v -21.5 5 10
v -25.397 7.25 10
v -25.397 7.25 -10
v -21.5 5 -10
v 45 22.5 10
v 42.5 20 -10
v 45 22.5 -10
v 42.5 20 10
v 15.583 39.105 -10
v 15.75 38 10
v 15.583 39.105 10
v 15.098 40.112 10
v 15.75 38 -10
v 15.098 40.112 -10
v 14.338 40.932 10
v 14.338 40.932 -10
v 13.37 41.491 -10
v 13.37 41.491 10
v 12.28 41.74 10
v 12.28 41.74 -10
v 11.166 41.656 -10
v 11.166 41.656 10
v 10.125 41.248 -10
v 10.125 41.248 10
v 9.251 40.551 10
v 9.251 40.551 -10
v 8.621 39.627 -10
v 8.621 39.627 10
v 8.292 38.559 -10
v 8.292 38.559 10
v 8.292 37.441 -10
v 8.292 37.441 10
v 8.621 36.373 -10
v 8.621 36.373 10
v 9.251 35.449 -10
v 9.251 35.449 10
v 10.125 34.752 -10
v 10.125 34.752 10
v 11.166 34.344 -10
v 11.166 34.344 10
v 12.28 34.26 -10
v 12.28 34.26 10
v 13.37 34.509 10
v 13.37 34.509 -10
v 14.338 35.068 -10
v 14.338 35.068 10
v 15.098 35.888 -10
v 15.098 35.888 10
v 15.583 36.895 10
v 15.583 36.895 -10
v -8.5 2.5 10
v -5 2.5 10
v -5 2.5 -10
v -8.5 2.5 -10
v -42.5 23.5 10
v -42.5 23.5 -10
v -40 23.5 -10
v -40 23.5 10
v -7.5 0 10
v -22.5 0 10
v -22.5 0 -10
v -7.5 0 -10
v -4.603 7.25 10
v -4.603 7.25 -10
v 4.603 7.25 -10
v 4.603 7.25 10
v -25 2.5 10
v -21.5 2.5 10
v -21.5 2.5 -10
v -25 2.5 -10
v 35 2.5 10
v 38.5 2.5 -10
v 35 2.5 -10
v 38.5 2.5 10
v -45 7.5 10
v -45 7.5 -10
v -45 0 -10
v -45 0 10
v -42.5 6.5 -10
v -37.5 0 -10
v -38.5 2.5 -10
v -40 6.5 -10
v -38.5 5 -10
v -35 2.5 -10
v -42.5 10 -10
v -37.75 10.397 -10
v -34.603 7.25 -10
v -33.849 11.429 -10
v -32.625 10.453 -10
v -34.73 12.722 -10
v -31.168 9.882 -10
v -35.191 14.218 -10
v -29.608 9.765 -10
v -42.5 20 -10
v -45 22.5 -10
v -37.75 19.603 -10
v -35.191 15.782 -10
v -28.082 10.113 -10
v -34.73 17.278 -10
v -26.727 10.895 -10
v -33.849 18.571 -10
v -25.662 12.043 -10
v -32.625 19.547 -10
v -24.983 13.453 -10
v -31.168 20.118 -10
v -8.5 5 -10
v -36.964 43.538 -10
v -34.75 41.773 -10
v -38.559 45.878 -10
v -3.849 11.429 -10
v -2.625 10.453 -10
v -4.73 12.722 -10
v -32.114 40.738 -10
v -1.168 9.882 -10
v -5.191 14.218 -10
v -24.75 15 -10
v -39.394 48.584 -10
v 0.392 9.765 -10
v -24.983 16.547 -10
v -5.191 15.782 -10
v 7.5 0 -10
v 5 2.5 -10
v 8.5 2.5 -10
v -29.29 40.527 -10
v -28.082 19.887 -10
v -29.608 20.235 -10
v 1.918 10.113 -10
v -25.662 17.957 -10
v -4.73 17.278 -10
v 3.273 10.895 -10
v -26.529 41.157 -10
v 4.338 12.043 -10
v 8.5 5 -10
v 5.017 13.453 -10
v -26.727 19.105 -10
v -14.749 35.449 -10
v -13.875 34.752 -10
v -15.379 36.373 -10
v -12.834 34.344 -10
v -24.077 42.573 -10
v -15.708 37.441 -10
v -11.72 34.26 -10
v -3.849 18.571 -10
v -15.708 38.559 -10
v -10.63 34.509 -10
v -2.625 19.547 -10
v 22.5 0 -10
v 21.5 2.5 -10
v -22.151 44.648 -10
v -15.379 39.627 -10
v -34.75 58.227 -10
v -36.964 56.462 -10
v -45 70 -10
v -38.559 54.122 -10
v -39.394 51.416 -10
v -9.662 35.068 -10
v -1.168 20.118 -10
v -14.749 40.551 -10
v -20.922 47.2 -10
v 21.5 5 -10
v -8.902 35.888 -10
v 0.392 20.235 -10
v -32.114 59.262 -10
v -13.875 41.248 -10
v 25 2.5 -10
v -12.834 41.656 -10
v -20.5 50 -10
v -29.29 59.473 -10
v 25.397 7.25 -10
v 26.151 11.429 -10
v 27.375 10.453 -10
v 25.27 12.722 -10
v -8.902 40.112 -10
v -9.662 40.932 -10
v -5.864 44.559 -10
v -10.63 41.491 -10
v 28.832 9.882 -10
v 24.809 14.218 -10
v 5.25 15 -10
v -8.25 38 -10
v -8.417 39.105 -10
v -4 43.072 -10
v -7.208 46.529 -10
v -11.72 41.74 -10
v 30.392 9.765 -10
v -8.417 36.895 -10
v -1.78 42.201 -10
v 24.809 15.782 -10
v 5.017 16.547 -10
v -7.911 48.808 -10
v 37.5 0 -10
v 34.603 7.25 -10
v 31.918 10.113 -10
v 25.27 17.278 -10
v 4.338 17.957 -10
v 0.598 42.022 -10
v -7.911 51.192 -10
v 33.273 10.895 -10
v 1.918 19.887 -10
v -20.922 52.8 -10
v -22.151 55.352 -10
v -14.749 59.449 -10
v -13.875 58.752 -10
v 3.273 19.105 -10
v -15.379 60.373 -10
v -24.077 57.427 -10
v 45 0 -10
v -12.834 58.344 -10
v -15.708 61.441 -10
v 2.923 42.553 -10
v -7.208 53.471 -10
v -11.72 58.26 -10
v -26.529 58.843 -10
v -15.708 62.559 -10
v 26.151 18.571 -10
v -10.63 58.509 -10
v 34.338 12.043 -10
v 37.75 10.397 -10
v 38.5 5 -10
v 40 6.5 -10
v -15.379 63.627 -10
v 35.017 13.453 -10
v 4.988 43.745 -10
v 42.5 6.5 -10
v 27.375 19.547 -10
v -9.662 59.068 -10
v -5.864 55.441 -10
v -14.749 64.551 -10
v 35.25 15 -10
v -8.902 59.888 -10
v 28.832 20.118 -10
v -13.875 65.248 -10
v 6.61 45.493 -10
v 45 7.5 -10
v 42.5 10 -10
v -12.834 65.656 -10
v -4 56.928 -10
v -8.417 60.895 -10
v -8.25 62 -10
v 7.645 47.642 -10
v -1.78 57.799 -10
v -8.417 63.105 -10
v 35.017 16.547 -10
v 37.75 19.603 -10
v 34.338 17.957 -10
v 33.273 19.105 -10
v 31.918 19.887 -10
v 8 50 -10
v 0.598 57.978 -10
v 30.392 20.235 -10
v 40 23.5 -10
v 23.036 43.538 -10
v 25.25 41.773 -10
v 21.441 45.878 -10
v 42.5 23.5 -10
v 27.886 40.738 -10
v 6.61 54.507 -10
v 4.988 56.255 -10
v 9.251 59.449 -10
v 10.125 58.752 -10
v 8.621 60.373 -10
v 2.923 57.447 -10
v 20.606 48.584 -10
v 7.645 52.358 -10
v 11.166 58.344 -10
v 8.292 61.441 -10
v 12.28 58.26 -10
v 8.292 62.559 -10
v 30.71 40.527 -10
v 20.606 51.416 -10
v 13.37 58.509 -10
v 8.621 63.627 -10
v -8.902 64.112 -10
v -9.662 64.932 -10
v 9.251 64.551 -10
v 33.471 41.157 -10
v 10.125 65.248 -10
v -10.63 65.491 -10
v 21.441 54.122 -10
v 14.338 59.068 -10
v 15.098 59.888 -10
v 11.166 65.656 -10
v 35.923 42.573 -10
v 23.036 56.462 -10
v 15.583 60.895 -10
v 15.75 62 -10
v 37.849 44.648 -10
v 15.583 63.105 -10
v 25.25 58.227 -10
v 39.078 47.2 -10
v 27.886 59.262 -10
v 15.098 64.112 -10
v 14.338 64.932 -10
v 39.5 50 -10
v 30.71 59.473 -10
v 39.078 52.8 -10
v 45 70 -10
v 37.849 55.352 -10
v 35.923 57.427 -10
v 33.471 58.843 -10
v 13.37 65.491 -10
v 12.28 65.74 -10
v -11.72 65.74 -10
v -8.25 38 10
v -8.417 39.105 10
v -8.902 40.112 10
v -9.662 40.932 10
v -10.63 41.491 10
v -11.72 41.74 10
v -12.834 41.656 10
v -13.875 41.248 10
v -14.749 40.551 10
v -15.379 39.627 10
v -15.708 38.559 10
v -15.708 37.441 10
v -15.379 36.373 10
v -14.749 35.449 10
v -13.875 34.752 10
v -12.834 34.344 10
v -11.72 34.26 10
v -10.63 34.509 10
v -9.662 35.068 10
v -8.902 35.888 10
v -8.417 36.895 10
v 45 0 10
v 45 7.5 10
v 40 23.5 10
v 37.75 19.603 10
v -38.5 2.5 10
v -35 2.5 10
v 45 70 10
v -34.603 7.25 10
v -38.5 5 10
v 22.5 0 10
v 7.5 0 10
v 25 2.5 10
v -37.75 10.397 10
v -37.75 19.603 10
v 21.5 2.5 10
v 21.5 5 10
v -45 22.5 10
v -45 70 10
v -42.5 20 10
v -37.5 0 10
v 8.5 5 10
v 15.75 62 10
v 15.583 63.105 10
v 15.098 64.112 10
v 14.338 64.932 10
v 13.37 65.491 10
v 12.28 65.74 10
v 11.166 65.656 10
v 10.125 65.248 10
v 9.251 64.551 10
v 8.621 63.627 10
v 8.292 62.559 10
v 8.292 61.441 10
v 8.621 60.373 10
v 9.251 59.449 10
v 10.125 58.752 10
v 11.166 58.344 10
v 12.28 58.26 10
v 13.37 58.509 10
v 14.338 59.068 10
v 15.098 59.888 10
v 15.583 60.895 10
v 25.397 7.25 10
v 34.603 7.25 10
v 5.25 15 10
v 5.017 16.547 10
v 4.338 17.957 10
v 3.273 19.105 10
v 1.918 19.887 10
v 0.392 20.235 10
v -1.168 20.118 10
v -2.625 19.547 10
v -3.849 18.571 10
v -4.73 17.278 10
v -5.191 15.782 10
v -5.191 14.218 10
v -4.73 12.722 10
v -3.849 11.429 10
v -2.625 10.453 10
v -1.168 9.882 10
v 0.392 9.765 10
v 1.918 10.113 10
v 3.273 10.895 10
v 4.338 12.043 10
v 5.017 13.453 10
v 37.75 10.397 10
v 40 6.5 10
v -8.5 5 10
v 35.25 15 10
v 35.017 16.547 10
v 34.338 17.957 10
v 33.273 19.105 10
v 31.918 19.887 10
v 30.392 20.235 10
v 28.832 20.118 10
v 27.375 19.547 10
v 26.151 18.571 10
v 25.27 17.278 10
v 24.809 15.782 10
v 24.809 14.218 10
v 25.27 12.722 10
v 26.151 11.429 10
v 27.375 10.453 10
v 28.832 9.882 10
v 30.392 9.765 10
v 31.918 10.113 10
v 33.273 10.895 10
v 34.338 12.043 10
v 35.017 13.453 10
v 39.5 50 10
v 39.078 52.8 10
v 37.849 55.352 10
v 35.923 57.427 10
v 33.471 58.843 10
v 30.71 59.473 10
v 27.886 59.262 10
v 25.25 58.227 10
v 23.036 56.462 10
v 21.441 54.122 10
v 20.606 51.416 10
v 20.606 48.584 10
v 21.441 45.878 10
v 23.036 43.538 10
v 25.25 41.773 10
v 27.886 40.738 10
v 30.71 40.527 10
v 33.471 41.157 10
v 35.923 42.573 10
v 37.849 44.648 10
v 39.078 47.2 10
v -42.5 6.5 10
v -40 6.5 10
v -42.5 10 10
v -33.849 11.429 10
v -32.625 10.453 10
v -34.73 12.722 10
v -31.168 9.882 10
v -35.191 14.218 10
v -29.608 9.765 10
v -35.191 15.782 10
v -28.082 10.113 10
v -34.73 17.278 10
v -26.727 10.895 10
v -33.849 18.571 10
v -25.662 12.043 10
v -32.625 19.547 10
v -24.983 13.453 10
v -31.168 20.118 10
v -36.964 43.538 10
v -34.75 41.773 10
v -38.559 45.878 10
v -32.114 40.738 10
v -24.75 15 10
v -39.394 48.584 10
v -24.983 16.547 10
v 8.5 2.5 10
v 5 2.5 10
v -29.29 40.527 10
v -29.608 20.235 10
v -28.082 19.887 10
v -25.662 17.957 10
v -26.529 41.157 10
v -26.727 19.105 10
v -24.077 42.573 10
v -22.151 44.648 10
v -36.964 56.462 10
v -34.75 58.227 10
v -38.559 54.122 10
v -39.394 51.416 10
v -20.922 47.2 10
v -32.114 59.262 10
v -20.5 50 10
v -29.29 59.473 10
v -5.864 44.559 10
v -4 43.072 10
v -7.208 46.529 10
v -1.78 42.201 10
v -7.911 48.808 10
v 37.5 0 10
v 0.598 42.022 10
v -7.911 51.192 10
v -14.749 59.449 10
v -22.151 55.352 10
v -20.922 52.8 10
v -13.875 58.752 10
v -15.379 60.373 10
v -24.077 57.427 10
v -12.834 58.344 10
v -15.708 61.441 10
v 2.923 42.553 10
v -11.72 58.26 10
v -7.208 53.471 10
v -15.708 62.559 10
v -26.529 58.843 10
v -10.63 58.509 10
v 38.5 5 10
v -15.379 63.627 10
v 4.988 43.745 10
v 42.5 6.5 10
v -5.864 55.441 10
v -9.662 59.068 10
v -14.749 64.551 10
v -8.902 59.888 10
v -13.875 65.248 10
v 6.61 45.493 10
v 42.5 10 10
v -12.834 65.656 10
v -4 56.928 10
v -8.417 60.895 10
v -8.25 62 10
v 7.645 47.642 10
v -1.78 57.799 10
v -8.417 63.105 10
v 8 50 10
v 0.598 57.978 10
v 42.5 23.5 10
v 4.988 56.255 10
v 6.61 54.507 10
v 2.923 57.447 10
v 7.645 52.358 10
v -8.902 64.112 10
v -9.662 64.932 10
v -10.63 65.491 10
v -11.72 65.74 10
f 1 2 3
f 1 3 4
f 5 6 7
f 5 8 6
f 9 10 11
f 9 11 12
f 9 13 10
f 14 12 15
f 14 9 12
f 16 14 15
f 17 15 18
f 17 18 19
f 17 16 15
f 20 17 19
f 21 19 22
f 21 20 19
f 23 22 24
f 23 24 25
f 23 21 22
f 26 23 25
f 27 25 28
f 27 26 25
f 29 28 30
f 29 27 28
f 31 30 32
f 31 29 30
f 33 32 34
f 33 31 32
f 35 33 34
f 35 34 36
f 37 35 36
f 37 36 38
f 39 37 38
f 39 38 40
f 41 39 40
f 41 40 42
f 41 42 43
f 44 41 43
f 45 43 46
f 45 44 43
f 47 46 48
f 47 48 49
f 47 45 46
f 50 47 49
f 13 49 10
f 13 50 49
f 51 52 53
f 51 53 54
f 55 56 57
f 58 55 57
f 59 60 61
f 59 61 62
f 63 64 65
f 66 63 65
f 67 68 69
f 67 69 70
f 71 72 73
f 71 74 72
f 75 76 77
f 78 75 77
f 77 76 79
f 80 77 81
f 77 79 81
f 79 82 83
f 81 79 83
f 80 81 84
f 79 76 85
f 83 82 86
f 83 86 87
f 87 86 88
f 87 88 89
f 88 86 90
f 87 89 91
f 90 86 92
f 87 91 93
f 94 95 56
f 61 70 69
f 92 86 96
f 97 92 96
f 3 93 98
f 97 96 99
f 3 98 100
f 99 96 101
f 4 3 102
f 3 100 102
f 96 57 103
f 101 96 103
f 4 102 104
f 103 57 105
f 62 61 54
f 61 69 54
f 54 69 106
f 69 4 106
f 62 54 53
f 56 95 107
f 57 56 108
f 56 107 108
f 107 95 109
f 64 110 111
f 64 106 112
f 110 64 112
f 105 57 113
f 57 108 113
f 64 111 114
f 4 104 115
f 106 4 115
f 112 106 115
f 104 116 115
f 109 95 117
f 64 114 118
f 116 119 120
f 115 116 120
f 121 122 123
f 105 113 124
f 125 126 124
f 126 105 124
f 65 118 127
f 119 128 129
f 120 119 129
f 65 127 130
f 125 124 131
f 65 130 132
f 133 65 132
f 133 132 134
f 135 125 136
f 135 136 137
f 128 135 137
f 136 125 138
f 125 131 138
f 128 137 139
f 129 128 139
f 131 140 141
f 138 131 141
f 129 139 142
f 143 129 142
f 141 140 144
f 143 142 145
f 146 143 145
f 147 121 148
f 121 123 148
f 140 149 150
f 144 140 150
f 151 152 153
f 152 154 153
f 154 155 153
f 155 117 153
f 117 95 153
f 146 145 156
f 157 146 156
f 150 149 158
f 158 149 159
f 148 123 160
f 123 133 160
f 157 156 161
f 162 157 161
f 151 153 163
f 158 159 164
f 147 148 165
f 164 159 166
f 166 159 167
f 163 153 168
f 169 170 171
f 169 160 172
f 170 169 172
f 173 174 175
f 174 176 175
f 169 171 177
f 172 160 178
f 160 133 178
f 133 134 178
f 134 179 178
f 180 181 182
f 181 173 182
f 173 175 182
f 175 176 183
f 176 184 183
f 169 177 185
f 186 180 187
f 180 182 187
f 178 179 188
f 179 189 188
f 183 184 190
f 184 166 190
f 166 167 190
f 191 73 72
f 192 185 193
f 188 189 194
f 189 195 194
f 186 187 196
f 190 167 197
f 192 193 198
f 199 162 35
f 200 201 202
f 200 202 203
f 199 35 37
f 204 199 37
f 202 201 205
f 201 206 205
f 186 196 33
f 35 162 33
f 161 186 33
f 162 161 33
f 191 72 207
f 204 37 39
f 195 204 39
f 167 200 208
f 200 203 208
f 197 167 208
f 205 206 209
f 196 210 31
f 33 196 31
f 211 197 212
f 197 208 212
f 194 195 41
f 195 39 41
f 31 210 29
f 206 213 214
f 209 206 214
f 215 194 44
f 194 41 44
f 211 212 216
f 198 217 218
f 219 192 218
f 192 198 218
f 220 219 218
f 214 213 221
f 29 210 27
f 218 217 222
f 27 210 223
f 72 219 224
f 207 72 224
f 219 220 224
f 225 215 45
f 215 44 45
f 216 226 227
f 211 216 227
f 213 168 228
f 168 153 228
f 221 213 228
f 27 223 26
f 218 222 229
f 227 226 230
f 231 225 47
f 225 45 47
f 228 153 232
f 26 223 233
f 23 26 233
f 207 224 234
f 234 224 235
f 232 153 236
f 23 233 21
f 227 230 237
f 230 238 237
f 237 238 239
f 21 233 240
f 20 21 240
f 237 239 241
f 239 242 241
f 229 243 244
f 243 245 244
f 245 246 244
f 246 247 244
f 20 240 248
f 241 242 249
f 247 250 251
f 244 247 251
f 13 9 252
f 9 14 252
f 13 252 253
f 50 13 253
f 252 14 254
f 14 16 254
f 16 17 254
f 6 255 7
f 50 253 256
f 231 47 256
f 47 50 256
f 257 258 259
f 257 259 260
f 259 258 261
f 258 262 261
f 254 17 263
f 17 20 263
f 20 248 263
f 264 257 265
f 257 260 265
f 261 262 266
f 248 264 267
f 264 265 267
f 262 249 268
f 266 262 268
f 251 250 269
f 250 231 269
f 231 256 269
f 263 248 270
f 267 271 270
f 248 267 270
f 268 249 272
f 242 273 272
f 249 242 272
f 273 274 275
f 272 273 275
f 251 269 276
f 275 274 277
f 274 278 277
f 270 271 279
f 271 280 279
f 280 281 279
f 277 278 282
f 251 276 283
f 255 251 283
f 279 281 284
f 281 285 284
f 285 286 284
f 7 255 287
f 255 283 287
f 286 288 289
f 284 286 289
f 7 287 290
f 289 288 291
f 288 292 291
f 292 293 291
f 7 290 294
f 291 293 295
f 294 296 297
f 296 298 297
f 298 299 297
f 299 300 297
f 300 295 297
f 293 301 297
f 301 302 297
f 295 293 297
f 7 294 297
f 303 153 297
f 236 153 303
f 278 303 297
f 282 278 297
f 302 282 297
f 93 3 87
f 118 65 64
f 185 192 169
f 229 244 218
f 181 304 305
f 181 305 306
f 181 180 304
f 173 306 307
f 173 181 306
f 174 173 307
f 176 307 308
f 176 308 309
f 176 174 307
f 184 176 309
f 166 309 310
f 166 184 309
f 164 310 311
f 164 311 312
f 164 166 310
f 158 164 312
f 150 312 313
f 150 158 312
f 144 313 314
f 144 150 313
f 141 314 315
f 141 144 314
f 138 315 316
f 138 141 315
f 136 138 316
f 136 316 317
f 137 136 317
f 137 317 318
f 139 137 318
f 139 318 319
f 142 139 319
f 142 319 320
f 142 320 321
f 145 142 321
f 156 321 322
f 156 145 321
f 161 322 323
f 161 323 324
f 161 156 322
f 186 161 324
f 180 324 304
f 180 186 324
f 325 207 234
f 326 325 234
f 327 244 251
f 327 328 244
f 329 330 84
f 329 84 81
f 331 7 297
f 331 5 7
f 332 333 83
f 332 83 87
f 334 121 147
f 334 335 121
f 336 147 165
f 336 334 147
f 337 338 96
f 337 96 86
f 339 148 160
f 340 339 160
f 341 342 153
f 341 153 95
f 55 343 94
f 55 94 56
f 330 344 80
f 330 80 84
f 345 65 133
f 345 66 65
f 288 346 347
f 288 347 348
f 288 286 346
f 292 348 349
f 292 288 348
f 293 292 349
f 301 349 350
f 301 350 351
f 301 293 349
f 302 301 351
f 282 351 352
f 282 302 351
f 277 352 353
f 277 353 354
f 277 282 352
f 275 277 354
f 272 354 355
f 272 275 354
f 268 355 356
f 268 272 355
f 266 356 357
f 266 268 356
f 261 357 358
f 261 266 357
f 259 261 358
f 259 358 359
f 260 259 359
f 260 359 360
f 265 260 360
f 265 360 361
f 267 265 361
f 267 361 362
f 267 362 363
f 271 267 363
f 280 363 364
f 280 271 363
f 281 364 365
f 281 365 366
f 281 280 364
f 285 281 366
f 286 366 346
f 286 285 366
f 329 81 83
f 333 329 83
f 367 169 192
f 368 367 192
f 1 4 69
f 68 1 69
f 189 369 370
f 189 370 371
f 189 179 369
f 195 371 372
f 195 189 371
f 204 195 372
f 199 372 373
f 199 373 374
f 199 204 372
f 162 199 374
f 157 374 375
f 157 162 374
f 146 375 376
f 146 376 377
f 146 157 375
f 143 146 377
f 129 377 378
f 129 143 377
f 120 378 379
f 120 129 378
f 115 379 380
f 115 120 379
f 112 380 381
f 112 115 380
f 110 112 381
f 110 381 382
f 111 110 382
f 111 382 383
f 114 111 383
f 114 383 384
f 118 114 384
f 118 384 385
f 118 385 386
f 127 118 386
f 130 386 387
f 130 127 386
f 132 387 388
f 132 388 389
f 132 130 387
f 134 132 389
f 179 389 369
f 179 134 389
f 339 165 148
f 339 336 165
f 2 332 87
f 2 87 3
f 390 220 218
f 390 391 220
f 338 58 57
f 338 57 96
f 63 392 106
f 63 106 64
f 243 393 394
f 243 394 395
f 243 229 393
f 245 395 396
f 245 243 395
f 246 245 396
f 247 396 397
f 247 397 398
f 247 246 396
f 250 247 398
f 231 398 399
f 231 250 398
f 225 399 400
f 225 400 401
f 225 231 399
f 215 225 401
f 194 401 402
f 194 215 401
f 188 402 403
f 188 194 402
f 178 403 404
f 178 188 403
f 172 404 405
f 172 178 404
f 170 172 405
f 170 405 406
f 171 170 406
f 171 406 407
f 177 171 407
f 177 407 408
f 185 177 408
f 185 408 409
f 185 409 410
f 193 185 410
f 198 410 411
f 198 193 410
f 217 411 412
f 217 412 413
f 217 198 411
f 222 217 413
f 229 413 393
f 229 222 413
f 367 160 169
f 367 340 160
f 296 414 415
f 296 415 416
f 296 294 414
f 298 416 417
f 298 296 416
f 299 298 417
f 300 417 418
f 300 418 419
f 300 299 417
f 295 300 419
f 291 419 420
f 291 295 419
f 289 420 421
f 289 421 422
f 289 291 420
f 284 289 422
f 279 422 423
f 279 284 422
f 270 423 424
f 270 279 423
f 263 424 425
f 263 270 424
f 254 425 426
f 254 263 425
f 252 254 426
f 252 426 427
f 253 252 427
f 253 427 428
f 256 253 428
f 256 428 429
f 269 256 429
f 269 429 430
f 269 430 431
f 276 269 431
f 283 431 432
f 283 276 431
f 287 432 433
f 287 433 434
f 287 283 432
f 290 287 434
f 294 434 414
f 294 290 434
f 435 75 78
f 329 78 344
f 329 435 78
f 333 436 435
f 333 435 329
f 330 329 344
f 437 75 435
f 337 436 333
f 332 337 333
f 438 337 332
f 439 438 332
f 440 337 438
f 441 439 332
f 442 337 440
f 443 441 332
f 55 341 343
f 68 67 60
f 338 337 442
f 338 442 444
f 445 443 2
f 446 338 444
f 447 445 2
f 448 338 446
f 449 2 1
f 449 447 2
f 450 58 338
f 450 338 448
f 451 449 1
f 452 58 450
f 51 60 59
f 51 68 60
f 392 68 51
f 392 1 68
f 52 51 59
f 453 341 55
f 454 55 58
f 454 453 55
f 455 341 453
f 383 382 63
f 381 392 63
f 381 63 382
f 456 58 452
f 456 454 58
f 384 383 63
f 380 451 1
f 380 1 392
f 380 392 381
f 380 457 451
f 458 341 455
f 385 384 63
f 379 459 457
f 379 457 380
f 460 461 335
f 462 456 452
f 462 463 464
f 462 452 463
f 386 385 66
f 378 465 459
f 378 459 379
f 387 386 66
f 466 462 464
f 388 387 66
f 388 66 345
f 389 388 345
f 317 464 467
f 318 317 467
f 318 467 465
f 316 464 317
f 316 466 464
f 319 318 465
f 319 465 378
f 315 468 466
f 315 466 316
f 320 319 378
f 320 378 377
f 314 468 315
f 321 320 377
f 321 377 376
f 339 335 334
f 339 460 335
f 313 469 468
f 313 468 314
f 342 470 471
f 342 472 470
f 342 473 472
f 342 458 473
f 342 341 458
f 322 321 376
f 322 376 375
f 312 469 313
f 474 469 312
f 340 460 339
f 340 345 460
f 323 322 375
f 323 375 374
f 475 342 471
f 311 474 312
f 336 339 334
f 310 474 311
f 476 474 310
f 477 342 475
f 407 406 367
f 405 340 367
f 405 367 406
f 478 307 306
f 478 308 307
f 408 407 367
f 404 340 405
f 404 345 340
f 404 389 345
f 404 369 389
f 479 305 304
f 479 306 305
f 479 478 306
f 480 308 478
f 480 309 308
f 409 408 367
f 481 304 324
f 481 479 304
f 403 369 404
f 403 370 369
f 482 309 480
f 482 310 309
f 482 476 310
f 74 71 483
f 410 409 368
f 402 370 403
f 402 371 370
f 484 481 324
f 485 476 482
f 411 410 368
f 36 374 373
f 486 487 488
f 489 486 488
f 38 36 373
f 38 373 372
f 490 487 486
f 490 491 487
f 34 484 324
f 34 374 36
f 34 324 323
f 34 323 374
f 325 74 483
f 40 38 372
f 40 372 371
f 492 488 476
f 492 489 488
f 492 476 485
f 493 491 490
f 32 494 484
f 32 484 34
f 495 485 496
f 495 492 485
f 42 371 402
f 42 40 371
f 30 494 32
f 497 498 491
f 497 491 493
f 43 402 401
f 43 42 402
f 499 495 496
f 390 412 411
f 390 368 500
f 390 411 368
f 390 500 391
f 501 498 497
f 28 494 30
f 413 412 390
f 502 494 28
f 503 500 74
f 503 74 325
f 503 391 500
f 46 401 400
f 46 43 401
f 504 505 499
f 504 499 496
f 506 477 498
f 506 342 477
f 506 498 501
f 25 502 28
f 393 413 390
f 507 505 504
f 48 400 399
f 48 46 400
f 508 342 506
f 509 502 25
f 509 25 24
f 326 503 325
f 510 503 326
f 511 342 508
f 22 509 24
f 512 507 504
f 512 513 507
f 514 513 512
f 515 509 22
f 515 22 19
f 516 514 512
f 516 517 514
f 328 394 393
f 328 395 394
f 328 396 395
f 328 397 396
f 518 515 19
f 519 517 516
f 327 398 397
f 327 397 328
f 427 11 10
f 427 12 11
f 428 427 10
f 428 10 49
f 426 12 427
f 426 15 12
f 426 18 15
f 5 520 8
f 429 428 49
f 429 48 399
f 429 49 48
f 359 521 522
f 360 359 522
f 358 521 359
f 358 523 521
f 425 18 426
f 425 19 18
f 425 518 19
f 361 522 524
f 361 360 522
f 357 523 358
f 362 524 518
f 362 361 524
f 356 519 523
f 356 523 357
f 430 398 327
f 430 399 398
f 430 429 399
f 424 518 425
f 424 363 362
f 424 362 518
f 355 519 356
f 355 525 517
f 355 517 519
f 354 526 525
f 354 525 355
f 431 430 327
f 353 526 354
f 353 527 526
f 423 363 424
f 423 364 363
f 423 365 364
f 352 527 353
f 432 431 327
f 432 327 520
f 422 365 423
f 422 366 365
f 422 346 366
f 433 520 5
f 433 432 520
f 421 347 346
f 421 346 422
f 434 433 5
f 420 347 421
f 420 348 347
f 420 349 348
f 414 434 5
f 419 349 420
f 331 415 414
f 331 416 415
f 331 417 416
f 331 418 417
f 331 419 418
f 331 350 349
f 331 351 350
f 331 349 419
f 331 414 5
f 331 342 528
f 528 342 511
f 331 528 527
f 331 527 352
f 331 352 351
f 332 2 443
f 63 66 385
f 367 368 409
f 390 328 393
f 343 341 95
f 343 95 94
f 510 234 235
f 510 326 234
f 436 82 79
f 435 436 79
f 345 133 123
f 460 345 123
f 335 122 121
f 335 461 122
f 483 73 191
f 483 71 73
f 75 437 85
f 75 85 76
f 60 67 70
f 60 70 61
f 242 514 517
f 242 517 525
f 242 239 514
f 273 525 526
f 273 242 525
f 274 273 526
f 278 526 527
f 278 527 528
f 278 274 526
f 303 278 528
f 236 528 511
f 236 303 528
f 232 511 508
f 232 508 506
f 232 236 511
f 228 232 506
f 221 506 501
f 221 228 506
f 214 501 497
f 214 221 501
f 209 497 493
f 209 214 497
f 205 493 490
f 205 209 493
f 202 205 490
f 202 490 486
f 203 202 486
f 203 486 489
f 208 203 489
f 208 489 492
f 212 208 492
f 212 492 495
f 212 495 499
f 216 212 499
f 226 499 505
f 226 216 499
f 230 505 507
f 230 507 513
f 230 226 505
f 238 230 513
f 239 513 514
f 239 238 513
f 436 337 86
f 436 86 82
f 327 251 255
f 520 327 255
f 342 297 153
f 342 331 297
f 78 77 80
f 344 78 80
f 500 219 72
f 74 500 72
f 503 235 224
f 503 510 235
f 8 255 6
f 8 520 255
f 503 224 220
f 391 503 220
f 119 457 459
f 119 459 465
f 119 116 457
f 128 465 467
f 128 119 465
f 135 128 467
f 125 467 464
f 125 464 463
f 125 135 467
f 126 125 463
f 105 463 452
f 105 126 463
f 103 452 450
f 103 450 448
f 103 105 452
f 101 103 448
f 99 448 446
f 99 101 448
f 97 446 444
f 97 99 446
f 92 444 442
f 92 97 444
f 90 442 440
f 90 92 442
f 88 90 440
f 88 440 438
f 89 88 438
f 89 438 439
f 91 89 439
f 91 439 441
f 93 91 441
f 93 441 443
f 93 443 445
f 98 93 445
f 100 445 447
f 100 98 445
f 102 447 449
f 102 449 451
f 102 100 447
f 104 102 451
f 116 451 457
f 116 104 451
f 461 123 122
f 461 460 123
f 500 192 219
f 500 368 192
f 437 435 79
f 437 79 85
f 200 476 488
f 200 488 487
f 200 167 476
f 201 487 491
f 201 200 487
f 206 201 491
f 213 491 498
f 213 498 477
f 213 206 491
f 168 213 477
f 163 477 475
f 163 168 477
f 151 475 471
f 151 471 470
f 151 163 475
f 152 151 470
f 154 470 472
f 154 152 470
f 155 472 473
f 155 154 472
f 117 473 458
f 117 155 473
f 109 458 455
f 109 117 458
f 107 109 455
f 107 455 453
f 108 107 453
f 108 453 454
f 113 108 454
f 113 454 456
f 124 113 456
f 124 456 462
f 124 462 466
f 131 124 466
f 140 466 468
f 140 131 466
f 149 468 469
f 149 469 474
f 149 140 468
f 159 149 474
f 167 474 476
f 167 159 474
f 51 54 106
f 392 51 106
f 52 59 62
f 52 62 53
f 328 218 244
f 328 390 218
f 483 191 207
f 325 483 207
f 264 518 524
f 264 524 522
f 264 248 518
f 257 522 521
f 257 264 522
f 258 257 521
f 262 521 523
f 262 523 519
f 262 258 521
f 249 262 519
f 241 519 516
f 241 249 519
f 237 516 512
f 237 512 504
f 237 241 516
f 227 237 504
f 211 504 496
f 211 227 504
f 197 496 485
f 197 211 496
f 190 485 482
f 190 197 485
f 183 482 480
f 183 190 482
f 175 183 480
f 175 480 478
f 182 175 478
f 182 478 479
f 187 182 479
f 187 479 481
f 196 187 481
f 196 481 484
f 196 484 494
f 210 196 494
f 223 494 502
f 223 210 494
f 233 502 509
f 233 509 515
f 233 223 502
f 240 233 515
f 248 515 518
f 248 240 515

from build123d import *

# Parameters (mm, degrees)
SKETCH1_R           = 5.25
SKETCH1_R_2         = 8
SKETCH1_R_3         = 9.5
SKETCH1_R_4         = 3.75
BOSS_EXTRUDE1_DEPTH = 10


with BuildPart() as part:
    # Sketch1 → Boss-Extrude1 (new, symmetric)
    with BuildSketch(Plane.XY):
        Polygon((45, 70), (-45, 70), (-45, 22.5), (-42.5, 20), (-42.5, 23.5), (-40, 23.5), (-37.75, 19.602885683), (-37.75, 10.397114317), (-40, 6.5), (-42.5, 6.5), (-42.5, 10), (-45, 7.5), (-45, 0), (-37.5, 0), (-35, 2.5), (-38.5, 2.5), (-38.5, 5), (-34.602885683, 7.25), (-25.397114317, 7.25), (-21.5, 5), (-21.5, 2.5), (-25, 2.5), (-22.5, 0), (-7.5, 0), (-5, 2.5), (-8.5, 2.5), (-8.5, 5), (-4.602885683, 7.25), (4.602885683, 7.25), (8.5, 5), (8.5, 2.5), (5, 2.5), (7.5, 0), (22.5, 0), (25, 2.5), (21.5, 2.5), (21.5, 5), (25.397114317, 7.25), (34.602885683, 7.25), (38.5, 5), (38.5, 2.5), (35, 2.5), (37.5, 0), (45, 0), (45, 7.5), (42.5, 10), (42.5, 6.5), (40, 6.5), (37.75, 10.397114317), (37.75, 19.602885683), (40, 23.5), (42.5, 23.5), (42.5, 20), (45, 22.5), align=None)
        with Locations((0, 15)):
            Circle(SKETCH1_R, mode=Mode.SUBTRACT)
        with Locations((-30, 15)):
            Circle(SKETCH1_R, mode=Mode.SUBTRACT)
        with Locations((30, 15)):
            Circle(SKETCH1_R, mode=Mode.SUBTRACT)
        with Locations((0, 50)):
            Circle(SKETCH1_R_2, mode=Mode.SUBTRACT)
        with Locations((30, 50)):
            Circle(SKETCH1_R_3, mode=Mode.SUBTRACT)
        with Locations((12, 62)):
            Circle(SKETCH1_R_4, mode=Mode.SUBTRACT)
        with Locations((12, 38)):
            Circle(SKETCH1_R_4, mode=Mode.SUBTRACT)
        with Locations((-12, 38)):
            Circle(SKETCH1_R_4, mode=Mode.SUBTRACT)
        with Locations((-12, 62)):
            Circle(SKETCH1_R_4, mode=Mode.SUBTRACT)
        with Locations((-30, 50)):
            Circle(SKETCH1_R_3, mode=Mode.SUBTRACT)
    extrude(amount=BOSS_EXTRUDE1_DEPTH, both=True)


solid = part.part
